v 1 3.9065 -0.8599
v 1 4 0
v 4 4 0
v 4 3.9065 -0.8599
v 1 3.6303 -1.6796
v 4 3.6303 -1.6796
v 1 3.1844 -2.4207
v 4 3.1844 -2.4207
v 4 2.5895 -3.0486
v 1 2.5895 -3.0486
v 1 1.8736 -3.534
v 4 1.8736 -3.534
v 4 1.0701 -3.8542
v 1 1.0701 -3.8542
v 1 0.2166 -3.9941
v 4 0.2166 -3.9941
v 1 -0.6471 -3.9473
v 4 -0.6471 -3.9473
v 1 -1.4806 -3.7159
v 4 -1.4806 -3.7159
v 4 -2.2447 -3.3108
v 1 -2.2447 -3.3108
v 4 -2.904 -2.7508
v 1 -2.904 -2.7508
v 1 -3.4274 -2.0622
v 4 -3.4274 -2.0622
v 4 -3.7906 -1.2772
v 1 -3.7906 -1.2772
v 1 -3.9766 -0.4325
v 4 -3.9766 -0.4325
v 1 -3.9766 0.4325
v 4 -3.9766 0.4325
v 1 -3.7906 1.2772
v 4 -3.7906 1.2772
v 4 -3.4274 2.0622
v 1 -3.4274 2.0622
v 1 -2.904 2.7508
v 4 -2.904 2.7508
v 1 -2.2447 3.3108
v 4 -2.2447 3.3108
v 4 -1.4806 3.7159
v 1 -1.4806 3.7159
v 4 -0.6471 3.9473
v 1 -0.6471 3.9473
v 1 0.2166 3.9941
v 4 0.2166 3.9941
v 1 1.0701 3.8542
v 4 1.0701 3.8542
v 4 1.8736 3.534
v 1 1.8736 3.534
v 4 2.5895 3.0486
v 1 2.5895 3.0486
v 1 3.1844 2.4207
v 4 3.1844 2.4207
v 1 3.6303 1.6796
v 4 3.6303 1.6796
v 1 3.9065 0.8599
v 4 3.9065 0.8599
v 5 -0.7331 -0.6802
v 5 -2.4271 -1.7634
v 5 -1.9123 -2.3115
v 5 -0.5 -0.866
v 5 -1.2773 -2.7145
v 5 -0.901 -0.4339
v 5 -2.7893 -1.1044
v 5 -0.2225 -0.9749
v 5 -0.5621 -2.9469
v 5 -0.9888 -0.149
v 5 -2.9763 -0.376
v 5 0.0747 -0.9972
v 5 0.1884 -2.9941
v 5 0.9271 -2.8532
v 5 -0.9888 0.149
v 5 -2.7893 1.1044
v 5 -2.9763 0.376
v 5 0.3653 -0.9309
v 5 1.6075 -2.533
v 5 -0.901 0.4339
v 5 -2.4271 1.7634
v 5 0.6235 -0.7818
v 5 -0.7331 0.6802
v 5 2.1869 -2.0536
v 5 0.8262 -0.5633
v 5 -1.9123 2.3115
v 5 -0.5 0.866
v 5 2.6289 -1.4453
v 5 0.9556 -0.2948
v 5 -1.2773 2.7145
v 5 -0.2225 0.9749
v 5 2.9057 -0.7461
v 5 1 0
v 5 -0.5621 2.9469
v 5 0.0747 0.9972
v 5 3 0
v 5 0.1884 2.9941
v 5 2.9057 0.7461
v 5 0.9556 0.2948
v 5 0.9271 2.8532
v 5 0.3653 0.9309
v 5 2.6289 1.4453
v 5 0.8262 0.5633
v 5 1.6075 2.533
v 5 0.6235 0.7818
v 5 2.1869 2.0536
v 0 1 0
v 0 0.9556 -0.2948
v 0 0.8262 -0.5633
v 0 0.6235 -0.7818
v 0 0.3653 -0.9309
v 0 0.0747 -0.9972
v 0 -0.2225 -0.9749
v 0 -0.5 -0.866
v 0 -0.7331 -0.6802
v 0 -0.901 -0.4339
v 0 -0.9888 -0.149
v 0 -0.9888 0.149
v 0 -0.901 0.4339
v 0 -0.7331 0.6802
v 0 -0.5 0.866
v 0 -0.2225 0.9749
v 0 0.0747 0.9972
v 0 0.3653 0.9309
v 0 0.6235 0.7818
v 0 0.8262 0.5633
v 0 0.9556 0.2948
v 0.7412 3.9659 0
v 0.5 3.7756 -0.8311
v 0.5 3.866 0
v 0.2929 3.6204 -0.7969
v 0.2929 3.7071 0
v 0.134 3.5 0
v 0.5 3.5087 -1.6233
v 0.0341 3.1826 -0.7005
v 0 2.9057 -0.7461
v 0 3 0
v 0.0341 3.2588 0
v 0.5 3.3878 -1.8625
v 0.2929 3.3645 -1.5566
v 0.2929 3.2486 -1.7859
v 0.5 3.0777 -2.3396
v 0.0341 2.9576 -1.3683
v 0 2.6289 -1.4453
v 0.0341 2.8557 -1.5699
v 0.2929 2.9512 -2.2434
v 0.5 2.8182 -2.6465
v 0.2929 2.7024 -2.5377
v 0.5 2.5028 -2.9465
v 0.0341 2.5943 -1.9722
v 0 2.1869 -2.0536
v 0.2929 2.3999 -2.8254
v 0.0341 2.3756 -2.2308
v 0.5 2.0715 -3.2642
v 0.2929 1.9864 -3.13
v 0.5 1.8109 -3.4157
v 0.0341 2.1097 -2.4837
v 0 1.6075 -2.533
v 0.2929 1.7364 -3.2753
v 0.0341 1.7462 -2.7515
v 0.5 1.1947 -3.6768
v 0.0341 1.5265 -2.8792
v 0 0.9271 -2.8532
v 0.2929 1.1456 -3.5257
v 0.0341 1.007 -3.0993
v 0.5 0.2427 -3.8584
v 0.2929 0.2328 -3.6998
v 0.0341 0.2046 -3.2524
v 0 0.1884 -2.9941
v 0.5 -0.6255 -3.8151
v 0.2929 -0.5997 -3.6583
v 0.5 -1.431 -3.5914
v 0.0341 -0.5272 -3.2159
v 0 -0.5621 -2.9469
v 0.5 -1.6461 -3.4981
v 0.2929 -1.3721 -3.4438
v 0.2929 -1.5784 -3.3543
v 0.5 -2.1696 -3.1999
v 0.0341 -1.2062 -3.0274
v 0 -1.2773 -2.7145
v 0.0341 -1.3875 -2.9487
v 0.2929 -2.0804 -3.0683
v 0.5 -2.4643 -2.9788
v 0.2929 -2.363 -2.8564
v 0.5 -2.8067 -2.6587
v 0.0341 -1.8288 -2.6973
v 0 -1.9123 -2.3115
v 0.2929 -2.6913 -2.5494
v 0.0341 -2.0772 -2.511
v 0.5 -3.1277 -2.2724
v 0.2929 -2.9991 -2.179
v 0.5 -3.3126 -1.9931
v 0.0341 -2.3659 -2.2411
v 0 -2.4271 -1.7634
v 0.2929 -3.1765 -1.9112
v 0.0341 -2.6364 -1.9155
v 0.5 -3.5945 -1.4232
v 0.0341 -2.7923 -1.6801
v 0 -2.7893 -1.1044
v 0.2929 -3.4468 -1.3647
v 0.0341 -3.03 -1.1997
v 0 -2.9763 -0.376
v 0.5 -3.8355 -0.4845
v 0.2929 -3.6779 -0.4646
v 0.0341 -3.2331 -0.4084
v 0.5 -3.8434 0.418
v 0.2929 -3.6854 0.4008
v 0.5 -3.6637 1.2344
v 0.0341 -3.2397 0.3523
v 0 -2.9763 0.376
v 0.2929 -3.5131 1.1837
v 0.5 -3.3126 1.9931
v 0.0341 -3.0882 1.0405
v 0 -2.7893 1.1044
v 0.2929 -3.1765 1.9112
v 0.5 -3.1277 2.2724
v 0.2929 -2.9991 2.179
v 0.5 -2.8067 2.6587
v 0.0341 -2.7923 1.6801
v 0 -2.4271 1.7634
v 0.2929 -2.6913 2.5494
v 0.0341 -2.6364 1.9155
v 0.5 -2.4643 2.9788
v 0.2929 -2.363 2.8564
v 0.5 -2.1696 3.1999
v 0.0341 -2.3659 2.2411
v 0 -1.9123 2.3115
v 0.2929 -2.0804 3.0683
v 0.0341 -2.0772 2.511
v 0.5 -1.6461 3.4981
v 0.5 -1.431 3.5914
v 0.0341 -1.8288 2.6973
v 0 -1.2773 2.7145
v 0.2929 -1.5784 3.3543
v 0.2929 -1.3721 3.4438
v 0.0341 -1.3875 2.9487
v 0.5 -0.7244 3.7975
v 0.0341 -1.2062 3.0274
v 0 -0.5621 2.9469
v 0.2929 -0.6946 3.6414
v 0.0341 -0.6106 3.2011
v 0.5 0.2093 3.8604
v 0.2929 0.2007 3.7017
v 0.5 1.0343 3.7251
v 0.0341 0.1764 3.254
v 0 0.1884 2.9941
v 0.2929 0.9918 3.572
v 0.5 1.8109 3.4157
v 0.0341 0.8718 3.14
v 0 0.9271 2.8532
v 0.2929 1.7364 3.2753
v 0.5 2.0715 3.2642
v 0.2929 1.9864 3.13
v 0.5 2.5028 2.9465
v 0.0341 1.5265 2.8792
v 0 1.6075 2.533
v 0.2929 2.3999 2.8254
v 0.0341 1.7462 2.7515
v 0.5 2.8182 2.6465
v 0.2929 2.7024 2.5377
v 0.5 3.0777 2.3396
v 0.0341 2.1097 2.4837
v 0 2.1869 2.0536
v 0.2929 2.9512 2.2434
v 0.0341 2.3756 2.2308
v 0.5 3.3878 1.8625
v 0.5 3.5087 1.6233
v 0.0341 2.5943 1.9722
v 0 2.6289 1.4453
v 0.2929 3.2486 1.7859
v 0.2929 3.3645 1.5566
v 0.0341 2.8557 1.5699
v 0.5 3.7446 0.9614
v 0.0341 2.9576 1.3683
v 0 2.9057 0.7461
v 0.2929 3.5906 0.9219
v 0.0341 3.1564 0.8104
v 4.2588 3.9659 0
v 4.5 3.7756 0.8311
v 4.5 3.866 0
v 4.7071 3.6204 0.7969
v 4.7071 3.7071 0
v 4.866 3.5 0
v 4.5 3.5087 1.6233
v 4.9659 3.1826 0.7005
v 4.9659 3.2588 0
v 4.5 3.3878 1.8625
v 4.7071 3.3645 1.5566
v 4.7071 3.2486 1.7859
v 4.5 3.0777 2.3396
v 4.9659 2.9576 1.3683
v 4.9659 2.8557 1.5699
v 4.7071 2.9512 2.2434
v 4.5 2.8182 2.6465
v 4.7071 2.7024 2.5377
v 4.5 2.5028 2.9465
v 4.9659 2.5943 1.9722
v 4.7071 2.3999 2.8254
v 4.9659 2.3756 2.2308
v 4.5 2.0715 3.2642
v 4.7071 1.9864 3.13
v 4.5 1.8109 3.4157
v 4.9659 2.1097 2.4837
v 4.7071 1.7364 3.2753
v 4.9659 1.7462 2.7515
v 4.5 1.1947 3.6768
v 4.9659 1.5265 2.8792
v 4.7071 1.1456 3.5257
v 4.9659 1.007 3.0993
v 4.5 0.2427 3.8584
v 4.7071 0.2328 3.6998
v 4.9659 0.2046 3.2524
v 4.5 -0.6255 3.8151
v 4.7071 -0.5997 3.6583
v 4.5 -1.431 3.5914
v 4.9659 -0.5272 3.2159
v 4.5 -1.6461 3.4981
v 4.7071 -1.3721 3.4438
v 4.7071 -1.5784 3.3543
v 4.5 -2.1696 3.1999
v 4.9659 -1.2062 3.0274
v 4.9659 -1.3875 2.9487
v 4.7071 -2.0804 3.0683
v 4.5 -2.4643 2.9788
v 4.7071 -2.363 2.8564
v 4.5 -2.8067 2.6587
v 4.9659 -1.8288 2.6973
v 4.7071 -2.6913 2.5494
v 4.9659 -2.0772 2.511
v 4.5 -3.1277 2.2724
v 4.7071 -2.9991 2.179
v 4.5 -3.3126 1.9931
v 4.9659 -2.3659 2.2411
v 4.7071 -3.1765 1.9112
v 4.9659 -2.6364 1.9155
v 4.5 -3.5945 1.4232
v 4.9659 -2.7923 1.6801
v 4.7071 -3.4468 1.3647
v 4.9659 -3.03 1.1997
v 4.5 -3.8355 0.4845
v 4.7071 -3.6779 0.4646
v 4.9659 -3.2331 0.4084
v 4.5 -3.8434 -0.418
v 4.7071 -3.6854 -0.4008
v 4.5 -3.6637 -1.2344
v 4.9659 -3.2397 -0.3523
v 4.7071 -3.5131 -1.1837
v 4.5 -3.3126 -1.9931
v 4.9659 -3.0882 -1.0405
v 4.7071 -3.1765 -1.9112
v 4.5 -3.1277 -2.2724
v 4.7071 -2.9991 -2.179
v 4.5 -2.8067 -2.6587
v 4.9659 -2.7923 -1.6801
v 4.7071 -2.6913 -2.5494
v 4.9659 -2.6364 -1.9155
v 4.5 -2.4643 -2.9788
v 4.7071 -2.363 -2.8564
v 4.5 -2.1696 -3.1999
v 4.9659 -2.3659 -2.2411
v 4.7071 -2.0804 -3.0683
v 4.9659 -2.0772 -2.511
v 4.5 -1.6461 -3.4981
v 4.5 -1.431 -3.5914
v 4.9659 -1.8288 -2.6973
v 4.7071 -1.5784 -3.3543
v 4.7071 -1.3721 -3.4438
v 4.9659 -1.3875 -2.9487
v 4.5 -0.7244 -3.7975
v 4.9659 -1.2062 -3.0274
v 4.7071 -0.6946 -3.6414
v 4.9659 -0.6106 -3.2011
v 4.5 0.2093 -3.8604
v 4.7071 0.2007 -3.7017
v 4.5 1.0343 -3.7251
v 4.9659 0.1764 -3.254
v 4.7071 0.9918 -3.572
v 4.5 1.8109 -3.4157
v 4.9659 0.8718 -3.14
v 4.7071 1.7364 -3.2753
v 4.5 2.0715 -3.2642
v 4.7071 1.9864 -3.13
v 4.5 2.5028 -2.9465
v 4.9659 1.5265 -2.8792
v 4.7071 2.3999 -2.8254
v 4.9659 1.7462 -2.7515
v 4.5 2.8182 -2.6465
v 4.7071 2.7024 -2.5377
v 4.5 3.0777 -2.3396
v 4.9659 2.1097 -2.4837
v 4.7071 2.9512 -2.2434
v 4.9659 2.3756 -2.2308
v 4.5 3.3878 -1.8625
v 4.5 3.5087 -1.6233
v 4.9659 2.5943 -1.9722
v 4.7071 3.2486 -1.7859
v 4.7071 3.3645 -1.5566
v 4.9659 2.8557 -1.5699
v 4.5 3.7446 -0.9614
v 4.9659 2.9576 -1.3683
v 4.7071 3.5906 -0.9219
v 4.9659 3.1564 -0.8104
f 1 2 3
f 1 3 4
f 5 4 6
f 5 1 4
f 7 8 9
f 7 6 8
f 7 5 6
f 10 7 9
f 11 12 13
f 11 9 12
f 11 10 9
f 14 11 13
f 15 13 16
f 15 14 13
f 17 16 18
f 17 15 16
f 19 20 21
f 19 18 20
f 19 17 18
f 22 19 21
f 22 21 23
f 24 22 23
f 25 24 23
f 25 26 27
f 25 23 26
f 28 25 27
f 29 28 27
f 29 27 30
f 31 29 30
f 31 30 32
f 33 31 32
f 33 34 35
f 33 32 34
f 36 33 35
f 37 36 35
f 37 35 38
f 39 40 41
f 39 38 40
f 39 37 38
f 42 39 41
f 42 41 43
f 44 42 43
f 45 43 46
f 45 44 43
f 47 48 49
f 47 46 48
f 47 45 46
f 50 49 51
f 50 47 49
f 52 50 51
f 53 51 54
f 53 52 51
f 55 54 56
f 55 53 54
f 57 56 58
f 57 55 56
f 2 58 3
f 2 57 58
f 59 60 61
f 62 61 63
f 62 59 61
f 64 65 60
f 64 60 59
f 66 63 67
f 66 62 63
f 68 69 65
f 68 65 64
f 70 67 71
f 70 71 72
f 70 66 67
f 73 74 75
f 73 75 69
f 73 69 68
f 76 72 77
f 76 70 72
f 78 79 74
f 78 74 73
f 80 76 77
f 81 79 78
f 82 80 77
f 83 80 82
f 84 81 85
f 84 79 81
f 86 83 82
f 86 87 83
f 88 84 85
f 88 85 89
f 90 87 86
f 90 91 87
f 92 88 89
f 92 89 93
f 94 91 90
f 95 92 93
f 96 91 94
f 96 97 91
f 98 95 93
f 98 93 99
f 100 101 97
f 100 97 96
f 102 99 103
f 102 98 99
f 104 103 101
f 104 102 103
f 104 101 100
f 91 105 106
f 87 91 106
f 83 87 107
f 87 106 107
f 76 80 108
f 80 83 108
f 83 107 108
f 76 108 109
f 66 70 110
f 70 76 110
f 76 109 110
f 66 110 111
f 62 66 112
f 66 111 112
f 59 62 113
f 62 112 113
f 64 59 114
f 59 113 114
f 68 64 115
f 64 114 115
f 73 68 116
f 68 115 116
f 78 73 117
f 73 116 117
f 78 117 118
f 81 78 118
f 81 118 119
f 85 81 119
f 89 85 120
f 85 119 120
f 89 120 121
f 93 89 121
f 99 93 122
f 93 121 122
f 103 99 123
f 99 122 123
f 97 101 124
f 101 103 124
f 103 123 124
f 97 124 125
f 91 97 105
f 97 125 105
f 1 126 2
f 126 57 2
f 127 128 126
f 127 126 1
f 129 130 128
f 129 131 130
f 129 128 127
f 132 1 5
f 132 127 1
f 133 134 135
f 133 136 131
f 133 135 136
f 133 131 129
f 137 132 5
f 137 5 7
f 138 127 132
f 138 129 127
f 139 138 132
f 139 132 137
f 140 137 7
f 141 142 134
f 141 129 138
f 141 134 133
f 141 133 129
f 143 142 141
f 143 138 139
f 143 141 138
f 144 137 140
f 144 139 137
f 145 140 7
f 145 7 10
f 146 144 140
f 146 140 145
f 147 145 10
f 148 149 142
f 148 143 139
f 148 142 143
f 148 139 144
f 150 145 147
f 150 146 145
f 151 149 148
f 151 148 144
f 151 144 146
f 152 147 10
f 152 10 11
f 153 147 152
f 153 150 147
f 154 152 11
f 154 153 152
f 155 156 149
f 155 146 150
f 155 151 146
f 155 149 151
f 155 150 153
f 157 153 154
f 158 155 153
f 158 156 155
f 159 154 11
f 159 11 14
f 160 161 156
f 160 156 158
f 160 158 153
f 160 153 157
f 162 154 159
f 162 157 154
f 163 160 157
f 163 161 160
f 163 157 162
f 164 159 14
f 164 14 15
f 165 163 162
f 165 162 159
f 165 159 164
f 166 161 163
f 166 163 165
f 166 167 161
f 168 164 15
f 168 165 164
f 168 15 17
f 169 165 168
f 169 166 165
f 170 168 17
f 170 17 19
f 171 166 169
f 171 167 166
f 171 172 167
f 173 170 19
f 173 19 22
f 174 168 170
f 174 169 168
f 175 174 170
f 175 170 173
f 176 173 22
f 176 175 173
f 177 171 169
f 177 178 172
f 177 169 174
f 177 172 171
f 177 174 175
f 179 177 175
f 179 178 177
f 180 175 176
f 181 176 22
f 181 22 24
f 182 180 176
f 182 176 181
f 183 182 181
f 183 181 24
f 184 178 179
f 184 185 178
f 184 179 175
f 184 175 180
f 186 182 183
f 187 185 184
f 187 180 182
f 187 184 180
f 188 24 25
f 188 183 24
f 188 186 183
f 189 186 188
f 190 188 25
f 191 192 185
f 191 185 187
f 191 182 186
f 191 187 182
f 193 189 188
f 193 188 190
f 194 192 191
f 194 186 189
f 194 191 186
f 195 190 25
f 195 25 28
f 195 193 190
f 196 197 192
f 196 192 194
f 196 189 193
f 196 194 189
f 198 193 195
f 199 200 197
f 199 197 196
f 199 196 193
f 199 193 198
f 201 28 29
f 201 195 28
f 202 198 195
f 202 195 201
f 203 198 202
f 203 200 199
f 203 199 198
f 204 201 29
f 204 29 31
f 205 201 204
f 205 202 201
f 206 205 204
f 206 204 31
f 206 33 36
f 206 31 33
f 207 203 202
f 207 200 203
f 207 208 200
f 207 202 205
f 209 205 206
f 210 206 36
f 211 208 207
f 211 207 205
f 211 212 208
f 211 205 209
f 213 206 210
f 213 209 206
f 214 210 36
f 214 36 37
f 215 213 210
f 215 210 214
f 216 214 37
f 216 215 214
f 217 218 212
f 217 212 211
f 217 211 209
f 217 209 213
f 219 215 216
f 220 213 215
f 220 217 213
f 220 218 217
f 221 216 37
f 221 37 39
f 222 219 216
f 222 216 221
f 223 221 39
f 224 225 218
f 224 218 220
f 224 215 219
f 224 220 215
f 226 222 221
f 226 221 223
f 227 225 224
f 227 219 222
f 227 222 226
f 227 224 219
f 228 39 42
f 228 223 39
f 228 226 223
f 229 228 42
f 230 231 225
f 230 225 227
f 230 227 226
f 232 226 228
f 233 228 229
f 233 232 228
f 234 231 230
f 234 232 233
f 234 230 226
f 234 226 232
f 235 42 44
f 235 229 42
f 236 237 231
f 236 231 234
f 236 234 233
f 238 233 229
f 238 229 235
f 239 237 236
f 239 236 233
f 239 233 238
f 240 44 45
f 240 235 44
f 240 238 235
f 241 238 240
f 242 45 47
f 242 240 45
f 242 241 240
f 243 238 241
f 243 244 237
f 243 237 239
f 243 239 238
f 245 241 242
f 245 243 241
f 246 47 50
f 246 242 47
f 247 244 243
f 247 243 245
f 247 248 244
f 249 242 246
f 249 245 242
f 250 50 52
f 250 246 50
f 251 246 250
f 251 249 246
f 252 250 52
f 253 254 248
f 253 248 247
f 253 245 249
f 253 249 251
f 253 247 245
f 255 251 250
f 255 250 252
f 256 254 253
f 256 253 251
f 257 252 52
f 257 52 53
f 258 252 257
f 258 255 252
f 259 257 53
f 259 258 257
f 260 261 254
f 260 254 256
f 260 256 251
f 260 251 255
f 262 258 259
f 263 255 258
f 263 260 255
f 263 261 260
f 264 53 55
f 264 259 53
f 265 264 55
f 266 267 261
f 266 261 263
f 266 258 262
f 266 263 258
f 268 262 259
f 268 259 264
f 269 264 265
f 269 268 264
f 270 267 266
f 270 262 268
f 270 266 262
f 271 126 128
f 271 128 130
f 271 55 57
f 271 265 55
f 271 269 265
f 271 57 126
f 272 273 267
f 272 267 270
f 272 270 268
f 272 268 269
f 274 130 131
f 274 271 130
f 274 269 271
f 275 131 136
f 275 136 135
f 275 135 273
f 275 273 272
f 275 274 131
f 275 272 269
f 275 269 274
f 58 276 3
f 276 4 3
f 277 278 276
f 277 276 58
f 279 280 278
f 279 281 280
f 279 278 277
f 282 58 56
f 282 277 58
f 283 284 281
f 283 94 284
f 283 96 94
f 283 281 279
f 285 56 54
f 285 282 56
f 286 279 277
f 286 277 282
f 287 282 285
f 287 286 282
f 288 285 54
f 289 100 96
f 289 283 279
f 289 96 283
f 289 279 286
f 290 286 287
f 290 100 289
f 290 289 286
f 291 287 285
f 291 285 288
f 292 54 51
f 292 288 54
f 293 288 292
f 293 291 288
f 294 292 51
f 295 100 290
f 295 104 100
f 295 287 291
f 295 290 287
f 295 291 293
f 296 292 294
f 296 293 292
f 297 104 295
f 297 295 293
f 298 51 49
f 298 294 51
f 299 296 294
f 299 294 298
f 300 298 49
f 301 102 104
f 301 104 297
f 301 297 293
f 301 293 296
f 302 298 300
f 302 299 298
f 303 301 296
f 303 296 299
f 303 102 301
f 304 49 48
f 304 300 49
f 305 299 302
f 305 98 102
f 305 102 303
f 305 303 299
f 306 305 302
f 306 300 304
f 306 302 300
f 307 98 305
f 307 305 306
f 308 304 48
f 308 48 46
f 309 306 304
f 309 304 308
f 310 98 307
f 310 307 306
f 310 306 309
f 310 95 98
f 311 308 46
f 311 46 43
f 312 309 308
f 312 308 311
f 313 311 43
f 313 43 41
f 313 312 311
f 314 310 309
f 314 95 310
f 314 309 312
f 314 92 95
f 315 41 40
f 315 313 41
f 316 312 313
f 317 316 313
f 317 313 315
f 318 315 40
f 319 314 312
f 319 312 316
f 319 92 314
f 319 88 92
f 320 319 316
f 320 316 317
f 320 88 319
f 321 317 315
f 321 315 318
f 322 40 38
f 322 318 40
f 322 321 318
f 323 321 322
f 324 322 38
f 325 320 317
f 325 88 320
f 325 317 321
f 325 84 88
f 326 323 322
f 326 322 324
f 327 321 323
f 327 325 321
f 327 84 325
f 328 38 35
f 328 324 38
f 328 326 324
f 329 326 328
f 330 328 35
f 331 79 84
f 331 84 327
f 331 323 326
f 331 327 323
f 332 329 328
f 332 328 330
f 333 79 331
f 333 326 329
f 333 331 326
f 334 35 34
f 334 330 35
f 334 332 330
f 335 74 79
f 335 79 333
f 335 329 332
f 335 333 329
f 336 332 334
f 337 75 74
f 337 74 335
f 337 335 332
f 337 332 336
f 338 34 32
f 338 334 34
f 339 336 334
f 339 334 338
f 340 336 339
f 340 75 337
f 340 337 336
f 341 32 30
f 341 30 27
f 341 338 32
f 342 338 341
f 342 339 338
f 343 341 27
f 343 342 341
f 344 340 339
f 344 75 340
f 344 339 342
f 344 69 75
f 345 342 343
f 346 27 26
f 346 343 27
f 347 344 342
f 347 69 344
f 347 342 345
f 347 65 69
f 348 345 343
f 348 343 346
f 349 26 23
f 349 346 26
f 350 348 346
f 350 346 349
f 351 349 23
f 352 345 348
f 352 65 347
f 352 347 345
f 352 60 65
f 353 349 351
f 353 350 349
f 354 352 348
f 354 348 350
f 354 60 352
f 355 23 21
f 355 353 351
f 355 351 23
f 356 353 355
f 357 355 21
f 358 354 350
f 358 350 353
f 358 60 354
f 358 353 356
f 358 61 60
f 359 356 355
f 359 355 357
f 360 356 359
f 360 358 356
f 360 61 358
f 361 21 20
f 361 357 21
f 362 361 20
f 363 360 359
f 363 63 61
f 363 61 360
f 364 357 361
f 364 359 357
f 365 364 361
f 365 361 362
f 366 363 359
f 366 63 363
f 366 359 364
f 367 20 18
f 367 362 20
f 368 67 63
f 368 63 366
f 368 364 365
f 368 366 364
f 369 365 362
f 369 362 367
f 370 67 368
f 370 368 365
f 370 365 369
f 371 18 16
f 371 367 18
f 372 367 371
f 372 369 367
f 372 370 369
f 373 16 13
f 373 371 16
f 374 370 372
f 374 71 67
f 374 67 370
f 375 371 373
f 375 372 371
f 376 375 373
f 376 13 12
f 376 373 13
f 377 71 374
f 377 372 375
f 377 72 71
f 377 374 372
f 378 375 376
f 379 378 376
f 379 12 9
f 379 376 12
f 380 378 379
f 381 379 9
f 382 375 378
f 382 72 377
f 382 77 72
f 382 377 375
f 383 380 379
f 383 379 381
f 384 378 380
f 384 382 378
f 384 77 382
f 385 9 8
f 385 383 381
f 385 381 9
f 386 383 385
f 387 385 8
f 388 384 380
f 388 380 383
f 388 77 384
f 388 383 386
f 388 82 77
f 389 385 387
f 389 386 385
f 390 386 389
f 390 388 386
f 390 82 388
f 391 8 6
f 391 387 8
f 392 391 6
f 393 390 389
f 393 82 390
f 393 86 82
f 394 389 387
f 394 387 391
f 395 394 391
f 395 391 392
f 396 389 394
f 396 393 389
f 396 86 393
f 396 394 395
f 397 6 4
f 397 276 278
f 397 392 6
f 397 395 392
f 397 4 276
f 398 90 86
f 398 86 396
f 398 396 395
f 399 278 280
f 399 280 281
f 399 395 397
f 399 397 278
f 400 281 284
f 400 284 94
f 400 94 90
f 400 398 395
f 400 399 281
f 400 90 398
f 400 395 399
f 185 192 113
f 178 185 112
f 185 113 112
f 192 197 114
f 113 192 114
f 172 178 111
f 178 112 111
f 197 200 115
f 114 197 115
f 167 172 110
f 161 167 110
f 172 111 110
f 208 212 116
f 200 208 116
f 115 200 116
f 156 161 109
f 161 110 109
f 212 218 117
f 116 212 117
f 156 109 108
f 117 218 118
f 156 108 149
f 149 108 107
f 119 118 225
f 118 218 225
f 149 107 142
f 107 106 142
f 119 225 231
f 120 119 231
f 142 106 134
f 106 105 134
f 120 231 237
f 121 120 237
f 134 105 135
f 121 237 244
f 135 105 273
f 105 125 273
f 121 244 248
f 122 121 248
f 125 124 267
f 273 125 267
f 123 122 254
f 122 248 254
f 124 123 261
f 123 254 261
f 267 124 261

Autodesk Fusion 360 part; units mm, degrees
sketch "Sketch1" plane through (0, 0, 0) normal (1, 0, 0) x (0, 1, 0)
  circle A0 centre (0, 0) radius 1
  circle A1 centre (0, 0) radius 4
  dimension "d1" = 2
  dimension "d2" = 8
extrude "Extrude1" add sketch "Sketch1" along normal blind 5
fillet "Fillet1" radius 1 1 edges at (0, -3.7293, -1.4465)
fillet "Fillet2" radius 1 1 edges at (5, -3.7293, -1.4465)
